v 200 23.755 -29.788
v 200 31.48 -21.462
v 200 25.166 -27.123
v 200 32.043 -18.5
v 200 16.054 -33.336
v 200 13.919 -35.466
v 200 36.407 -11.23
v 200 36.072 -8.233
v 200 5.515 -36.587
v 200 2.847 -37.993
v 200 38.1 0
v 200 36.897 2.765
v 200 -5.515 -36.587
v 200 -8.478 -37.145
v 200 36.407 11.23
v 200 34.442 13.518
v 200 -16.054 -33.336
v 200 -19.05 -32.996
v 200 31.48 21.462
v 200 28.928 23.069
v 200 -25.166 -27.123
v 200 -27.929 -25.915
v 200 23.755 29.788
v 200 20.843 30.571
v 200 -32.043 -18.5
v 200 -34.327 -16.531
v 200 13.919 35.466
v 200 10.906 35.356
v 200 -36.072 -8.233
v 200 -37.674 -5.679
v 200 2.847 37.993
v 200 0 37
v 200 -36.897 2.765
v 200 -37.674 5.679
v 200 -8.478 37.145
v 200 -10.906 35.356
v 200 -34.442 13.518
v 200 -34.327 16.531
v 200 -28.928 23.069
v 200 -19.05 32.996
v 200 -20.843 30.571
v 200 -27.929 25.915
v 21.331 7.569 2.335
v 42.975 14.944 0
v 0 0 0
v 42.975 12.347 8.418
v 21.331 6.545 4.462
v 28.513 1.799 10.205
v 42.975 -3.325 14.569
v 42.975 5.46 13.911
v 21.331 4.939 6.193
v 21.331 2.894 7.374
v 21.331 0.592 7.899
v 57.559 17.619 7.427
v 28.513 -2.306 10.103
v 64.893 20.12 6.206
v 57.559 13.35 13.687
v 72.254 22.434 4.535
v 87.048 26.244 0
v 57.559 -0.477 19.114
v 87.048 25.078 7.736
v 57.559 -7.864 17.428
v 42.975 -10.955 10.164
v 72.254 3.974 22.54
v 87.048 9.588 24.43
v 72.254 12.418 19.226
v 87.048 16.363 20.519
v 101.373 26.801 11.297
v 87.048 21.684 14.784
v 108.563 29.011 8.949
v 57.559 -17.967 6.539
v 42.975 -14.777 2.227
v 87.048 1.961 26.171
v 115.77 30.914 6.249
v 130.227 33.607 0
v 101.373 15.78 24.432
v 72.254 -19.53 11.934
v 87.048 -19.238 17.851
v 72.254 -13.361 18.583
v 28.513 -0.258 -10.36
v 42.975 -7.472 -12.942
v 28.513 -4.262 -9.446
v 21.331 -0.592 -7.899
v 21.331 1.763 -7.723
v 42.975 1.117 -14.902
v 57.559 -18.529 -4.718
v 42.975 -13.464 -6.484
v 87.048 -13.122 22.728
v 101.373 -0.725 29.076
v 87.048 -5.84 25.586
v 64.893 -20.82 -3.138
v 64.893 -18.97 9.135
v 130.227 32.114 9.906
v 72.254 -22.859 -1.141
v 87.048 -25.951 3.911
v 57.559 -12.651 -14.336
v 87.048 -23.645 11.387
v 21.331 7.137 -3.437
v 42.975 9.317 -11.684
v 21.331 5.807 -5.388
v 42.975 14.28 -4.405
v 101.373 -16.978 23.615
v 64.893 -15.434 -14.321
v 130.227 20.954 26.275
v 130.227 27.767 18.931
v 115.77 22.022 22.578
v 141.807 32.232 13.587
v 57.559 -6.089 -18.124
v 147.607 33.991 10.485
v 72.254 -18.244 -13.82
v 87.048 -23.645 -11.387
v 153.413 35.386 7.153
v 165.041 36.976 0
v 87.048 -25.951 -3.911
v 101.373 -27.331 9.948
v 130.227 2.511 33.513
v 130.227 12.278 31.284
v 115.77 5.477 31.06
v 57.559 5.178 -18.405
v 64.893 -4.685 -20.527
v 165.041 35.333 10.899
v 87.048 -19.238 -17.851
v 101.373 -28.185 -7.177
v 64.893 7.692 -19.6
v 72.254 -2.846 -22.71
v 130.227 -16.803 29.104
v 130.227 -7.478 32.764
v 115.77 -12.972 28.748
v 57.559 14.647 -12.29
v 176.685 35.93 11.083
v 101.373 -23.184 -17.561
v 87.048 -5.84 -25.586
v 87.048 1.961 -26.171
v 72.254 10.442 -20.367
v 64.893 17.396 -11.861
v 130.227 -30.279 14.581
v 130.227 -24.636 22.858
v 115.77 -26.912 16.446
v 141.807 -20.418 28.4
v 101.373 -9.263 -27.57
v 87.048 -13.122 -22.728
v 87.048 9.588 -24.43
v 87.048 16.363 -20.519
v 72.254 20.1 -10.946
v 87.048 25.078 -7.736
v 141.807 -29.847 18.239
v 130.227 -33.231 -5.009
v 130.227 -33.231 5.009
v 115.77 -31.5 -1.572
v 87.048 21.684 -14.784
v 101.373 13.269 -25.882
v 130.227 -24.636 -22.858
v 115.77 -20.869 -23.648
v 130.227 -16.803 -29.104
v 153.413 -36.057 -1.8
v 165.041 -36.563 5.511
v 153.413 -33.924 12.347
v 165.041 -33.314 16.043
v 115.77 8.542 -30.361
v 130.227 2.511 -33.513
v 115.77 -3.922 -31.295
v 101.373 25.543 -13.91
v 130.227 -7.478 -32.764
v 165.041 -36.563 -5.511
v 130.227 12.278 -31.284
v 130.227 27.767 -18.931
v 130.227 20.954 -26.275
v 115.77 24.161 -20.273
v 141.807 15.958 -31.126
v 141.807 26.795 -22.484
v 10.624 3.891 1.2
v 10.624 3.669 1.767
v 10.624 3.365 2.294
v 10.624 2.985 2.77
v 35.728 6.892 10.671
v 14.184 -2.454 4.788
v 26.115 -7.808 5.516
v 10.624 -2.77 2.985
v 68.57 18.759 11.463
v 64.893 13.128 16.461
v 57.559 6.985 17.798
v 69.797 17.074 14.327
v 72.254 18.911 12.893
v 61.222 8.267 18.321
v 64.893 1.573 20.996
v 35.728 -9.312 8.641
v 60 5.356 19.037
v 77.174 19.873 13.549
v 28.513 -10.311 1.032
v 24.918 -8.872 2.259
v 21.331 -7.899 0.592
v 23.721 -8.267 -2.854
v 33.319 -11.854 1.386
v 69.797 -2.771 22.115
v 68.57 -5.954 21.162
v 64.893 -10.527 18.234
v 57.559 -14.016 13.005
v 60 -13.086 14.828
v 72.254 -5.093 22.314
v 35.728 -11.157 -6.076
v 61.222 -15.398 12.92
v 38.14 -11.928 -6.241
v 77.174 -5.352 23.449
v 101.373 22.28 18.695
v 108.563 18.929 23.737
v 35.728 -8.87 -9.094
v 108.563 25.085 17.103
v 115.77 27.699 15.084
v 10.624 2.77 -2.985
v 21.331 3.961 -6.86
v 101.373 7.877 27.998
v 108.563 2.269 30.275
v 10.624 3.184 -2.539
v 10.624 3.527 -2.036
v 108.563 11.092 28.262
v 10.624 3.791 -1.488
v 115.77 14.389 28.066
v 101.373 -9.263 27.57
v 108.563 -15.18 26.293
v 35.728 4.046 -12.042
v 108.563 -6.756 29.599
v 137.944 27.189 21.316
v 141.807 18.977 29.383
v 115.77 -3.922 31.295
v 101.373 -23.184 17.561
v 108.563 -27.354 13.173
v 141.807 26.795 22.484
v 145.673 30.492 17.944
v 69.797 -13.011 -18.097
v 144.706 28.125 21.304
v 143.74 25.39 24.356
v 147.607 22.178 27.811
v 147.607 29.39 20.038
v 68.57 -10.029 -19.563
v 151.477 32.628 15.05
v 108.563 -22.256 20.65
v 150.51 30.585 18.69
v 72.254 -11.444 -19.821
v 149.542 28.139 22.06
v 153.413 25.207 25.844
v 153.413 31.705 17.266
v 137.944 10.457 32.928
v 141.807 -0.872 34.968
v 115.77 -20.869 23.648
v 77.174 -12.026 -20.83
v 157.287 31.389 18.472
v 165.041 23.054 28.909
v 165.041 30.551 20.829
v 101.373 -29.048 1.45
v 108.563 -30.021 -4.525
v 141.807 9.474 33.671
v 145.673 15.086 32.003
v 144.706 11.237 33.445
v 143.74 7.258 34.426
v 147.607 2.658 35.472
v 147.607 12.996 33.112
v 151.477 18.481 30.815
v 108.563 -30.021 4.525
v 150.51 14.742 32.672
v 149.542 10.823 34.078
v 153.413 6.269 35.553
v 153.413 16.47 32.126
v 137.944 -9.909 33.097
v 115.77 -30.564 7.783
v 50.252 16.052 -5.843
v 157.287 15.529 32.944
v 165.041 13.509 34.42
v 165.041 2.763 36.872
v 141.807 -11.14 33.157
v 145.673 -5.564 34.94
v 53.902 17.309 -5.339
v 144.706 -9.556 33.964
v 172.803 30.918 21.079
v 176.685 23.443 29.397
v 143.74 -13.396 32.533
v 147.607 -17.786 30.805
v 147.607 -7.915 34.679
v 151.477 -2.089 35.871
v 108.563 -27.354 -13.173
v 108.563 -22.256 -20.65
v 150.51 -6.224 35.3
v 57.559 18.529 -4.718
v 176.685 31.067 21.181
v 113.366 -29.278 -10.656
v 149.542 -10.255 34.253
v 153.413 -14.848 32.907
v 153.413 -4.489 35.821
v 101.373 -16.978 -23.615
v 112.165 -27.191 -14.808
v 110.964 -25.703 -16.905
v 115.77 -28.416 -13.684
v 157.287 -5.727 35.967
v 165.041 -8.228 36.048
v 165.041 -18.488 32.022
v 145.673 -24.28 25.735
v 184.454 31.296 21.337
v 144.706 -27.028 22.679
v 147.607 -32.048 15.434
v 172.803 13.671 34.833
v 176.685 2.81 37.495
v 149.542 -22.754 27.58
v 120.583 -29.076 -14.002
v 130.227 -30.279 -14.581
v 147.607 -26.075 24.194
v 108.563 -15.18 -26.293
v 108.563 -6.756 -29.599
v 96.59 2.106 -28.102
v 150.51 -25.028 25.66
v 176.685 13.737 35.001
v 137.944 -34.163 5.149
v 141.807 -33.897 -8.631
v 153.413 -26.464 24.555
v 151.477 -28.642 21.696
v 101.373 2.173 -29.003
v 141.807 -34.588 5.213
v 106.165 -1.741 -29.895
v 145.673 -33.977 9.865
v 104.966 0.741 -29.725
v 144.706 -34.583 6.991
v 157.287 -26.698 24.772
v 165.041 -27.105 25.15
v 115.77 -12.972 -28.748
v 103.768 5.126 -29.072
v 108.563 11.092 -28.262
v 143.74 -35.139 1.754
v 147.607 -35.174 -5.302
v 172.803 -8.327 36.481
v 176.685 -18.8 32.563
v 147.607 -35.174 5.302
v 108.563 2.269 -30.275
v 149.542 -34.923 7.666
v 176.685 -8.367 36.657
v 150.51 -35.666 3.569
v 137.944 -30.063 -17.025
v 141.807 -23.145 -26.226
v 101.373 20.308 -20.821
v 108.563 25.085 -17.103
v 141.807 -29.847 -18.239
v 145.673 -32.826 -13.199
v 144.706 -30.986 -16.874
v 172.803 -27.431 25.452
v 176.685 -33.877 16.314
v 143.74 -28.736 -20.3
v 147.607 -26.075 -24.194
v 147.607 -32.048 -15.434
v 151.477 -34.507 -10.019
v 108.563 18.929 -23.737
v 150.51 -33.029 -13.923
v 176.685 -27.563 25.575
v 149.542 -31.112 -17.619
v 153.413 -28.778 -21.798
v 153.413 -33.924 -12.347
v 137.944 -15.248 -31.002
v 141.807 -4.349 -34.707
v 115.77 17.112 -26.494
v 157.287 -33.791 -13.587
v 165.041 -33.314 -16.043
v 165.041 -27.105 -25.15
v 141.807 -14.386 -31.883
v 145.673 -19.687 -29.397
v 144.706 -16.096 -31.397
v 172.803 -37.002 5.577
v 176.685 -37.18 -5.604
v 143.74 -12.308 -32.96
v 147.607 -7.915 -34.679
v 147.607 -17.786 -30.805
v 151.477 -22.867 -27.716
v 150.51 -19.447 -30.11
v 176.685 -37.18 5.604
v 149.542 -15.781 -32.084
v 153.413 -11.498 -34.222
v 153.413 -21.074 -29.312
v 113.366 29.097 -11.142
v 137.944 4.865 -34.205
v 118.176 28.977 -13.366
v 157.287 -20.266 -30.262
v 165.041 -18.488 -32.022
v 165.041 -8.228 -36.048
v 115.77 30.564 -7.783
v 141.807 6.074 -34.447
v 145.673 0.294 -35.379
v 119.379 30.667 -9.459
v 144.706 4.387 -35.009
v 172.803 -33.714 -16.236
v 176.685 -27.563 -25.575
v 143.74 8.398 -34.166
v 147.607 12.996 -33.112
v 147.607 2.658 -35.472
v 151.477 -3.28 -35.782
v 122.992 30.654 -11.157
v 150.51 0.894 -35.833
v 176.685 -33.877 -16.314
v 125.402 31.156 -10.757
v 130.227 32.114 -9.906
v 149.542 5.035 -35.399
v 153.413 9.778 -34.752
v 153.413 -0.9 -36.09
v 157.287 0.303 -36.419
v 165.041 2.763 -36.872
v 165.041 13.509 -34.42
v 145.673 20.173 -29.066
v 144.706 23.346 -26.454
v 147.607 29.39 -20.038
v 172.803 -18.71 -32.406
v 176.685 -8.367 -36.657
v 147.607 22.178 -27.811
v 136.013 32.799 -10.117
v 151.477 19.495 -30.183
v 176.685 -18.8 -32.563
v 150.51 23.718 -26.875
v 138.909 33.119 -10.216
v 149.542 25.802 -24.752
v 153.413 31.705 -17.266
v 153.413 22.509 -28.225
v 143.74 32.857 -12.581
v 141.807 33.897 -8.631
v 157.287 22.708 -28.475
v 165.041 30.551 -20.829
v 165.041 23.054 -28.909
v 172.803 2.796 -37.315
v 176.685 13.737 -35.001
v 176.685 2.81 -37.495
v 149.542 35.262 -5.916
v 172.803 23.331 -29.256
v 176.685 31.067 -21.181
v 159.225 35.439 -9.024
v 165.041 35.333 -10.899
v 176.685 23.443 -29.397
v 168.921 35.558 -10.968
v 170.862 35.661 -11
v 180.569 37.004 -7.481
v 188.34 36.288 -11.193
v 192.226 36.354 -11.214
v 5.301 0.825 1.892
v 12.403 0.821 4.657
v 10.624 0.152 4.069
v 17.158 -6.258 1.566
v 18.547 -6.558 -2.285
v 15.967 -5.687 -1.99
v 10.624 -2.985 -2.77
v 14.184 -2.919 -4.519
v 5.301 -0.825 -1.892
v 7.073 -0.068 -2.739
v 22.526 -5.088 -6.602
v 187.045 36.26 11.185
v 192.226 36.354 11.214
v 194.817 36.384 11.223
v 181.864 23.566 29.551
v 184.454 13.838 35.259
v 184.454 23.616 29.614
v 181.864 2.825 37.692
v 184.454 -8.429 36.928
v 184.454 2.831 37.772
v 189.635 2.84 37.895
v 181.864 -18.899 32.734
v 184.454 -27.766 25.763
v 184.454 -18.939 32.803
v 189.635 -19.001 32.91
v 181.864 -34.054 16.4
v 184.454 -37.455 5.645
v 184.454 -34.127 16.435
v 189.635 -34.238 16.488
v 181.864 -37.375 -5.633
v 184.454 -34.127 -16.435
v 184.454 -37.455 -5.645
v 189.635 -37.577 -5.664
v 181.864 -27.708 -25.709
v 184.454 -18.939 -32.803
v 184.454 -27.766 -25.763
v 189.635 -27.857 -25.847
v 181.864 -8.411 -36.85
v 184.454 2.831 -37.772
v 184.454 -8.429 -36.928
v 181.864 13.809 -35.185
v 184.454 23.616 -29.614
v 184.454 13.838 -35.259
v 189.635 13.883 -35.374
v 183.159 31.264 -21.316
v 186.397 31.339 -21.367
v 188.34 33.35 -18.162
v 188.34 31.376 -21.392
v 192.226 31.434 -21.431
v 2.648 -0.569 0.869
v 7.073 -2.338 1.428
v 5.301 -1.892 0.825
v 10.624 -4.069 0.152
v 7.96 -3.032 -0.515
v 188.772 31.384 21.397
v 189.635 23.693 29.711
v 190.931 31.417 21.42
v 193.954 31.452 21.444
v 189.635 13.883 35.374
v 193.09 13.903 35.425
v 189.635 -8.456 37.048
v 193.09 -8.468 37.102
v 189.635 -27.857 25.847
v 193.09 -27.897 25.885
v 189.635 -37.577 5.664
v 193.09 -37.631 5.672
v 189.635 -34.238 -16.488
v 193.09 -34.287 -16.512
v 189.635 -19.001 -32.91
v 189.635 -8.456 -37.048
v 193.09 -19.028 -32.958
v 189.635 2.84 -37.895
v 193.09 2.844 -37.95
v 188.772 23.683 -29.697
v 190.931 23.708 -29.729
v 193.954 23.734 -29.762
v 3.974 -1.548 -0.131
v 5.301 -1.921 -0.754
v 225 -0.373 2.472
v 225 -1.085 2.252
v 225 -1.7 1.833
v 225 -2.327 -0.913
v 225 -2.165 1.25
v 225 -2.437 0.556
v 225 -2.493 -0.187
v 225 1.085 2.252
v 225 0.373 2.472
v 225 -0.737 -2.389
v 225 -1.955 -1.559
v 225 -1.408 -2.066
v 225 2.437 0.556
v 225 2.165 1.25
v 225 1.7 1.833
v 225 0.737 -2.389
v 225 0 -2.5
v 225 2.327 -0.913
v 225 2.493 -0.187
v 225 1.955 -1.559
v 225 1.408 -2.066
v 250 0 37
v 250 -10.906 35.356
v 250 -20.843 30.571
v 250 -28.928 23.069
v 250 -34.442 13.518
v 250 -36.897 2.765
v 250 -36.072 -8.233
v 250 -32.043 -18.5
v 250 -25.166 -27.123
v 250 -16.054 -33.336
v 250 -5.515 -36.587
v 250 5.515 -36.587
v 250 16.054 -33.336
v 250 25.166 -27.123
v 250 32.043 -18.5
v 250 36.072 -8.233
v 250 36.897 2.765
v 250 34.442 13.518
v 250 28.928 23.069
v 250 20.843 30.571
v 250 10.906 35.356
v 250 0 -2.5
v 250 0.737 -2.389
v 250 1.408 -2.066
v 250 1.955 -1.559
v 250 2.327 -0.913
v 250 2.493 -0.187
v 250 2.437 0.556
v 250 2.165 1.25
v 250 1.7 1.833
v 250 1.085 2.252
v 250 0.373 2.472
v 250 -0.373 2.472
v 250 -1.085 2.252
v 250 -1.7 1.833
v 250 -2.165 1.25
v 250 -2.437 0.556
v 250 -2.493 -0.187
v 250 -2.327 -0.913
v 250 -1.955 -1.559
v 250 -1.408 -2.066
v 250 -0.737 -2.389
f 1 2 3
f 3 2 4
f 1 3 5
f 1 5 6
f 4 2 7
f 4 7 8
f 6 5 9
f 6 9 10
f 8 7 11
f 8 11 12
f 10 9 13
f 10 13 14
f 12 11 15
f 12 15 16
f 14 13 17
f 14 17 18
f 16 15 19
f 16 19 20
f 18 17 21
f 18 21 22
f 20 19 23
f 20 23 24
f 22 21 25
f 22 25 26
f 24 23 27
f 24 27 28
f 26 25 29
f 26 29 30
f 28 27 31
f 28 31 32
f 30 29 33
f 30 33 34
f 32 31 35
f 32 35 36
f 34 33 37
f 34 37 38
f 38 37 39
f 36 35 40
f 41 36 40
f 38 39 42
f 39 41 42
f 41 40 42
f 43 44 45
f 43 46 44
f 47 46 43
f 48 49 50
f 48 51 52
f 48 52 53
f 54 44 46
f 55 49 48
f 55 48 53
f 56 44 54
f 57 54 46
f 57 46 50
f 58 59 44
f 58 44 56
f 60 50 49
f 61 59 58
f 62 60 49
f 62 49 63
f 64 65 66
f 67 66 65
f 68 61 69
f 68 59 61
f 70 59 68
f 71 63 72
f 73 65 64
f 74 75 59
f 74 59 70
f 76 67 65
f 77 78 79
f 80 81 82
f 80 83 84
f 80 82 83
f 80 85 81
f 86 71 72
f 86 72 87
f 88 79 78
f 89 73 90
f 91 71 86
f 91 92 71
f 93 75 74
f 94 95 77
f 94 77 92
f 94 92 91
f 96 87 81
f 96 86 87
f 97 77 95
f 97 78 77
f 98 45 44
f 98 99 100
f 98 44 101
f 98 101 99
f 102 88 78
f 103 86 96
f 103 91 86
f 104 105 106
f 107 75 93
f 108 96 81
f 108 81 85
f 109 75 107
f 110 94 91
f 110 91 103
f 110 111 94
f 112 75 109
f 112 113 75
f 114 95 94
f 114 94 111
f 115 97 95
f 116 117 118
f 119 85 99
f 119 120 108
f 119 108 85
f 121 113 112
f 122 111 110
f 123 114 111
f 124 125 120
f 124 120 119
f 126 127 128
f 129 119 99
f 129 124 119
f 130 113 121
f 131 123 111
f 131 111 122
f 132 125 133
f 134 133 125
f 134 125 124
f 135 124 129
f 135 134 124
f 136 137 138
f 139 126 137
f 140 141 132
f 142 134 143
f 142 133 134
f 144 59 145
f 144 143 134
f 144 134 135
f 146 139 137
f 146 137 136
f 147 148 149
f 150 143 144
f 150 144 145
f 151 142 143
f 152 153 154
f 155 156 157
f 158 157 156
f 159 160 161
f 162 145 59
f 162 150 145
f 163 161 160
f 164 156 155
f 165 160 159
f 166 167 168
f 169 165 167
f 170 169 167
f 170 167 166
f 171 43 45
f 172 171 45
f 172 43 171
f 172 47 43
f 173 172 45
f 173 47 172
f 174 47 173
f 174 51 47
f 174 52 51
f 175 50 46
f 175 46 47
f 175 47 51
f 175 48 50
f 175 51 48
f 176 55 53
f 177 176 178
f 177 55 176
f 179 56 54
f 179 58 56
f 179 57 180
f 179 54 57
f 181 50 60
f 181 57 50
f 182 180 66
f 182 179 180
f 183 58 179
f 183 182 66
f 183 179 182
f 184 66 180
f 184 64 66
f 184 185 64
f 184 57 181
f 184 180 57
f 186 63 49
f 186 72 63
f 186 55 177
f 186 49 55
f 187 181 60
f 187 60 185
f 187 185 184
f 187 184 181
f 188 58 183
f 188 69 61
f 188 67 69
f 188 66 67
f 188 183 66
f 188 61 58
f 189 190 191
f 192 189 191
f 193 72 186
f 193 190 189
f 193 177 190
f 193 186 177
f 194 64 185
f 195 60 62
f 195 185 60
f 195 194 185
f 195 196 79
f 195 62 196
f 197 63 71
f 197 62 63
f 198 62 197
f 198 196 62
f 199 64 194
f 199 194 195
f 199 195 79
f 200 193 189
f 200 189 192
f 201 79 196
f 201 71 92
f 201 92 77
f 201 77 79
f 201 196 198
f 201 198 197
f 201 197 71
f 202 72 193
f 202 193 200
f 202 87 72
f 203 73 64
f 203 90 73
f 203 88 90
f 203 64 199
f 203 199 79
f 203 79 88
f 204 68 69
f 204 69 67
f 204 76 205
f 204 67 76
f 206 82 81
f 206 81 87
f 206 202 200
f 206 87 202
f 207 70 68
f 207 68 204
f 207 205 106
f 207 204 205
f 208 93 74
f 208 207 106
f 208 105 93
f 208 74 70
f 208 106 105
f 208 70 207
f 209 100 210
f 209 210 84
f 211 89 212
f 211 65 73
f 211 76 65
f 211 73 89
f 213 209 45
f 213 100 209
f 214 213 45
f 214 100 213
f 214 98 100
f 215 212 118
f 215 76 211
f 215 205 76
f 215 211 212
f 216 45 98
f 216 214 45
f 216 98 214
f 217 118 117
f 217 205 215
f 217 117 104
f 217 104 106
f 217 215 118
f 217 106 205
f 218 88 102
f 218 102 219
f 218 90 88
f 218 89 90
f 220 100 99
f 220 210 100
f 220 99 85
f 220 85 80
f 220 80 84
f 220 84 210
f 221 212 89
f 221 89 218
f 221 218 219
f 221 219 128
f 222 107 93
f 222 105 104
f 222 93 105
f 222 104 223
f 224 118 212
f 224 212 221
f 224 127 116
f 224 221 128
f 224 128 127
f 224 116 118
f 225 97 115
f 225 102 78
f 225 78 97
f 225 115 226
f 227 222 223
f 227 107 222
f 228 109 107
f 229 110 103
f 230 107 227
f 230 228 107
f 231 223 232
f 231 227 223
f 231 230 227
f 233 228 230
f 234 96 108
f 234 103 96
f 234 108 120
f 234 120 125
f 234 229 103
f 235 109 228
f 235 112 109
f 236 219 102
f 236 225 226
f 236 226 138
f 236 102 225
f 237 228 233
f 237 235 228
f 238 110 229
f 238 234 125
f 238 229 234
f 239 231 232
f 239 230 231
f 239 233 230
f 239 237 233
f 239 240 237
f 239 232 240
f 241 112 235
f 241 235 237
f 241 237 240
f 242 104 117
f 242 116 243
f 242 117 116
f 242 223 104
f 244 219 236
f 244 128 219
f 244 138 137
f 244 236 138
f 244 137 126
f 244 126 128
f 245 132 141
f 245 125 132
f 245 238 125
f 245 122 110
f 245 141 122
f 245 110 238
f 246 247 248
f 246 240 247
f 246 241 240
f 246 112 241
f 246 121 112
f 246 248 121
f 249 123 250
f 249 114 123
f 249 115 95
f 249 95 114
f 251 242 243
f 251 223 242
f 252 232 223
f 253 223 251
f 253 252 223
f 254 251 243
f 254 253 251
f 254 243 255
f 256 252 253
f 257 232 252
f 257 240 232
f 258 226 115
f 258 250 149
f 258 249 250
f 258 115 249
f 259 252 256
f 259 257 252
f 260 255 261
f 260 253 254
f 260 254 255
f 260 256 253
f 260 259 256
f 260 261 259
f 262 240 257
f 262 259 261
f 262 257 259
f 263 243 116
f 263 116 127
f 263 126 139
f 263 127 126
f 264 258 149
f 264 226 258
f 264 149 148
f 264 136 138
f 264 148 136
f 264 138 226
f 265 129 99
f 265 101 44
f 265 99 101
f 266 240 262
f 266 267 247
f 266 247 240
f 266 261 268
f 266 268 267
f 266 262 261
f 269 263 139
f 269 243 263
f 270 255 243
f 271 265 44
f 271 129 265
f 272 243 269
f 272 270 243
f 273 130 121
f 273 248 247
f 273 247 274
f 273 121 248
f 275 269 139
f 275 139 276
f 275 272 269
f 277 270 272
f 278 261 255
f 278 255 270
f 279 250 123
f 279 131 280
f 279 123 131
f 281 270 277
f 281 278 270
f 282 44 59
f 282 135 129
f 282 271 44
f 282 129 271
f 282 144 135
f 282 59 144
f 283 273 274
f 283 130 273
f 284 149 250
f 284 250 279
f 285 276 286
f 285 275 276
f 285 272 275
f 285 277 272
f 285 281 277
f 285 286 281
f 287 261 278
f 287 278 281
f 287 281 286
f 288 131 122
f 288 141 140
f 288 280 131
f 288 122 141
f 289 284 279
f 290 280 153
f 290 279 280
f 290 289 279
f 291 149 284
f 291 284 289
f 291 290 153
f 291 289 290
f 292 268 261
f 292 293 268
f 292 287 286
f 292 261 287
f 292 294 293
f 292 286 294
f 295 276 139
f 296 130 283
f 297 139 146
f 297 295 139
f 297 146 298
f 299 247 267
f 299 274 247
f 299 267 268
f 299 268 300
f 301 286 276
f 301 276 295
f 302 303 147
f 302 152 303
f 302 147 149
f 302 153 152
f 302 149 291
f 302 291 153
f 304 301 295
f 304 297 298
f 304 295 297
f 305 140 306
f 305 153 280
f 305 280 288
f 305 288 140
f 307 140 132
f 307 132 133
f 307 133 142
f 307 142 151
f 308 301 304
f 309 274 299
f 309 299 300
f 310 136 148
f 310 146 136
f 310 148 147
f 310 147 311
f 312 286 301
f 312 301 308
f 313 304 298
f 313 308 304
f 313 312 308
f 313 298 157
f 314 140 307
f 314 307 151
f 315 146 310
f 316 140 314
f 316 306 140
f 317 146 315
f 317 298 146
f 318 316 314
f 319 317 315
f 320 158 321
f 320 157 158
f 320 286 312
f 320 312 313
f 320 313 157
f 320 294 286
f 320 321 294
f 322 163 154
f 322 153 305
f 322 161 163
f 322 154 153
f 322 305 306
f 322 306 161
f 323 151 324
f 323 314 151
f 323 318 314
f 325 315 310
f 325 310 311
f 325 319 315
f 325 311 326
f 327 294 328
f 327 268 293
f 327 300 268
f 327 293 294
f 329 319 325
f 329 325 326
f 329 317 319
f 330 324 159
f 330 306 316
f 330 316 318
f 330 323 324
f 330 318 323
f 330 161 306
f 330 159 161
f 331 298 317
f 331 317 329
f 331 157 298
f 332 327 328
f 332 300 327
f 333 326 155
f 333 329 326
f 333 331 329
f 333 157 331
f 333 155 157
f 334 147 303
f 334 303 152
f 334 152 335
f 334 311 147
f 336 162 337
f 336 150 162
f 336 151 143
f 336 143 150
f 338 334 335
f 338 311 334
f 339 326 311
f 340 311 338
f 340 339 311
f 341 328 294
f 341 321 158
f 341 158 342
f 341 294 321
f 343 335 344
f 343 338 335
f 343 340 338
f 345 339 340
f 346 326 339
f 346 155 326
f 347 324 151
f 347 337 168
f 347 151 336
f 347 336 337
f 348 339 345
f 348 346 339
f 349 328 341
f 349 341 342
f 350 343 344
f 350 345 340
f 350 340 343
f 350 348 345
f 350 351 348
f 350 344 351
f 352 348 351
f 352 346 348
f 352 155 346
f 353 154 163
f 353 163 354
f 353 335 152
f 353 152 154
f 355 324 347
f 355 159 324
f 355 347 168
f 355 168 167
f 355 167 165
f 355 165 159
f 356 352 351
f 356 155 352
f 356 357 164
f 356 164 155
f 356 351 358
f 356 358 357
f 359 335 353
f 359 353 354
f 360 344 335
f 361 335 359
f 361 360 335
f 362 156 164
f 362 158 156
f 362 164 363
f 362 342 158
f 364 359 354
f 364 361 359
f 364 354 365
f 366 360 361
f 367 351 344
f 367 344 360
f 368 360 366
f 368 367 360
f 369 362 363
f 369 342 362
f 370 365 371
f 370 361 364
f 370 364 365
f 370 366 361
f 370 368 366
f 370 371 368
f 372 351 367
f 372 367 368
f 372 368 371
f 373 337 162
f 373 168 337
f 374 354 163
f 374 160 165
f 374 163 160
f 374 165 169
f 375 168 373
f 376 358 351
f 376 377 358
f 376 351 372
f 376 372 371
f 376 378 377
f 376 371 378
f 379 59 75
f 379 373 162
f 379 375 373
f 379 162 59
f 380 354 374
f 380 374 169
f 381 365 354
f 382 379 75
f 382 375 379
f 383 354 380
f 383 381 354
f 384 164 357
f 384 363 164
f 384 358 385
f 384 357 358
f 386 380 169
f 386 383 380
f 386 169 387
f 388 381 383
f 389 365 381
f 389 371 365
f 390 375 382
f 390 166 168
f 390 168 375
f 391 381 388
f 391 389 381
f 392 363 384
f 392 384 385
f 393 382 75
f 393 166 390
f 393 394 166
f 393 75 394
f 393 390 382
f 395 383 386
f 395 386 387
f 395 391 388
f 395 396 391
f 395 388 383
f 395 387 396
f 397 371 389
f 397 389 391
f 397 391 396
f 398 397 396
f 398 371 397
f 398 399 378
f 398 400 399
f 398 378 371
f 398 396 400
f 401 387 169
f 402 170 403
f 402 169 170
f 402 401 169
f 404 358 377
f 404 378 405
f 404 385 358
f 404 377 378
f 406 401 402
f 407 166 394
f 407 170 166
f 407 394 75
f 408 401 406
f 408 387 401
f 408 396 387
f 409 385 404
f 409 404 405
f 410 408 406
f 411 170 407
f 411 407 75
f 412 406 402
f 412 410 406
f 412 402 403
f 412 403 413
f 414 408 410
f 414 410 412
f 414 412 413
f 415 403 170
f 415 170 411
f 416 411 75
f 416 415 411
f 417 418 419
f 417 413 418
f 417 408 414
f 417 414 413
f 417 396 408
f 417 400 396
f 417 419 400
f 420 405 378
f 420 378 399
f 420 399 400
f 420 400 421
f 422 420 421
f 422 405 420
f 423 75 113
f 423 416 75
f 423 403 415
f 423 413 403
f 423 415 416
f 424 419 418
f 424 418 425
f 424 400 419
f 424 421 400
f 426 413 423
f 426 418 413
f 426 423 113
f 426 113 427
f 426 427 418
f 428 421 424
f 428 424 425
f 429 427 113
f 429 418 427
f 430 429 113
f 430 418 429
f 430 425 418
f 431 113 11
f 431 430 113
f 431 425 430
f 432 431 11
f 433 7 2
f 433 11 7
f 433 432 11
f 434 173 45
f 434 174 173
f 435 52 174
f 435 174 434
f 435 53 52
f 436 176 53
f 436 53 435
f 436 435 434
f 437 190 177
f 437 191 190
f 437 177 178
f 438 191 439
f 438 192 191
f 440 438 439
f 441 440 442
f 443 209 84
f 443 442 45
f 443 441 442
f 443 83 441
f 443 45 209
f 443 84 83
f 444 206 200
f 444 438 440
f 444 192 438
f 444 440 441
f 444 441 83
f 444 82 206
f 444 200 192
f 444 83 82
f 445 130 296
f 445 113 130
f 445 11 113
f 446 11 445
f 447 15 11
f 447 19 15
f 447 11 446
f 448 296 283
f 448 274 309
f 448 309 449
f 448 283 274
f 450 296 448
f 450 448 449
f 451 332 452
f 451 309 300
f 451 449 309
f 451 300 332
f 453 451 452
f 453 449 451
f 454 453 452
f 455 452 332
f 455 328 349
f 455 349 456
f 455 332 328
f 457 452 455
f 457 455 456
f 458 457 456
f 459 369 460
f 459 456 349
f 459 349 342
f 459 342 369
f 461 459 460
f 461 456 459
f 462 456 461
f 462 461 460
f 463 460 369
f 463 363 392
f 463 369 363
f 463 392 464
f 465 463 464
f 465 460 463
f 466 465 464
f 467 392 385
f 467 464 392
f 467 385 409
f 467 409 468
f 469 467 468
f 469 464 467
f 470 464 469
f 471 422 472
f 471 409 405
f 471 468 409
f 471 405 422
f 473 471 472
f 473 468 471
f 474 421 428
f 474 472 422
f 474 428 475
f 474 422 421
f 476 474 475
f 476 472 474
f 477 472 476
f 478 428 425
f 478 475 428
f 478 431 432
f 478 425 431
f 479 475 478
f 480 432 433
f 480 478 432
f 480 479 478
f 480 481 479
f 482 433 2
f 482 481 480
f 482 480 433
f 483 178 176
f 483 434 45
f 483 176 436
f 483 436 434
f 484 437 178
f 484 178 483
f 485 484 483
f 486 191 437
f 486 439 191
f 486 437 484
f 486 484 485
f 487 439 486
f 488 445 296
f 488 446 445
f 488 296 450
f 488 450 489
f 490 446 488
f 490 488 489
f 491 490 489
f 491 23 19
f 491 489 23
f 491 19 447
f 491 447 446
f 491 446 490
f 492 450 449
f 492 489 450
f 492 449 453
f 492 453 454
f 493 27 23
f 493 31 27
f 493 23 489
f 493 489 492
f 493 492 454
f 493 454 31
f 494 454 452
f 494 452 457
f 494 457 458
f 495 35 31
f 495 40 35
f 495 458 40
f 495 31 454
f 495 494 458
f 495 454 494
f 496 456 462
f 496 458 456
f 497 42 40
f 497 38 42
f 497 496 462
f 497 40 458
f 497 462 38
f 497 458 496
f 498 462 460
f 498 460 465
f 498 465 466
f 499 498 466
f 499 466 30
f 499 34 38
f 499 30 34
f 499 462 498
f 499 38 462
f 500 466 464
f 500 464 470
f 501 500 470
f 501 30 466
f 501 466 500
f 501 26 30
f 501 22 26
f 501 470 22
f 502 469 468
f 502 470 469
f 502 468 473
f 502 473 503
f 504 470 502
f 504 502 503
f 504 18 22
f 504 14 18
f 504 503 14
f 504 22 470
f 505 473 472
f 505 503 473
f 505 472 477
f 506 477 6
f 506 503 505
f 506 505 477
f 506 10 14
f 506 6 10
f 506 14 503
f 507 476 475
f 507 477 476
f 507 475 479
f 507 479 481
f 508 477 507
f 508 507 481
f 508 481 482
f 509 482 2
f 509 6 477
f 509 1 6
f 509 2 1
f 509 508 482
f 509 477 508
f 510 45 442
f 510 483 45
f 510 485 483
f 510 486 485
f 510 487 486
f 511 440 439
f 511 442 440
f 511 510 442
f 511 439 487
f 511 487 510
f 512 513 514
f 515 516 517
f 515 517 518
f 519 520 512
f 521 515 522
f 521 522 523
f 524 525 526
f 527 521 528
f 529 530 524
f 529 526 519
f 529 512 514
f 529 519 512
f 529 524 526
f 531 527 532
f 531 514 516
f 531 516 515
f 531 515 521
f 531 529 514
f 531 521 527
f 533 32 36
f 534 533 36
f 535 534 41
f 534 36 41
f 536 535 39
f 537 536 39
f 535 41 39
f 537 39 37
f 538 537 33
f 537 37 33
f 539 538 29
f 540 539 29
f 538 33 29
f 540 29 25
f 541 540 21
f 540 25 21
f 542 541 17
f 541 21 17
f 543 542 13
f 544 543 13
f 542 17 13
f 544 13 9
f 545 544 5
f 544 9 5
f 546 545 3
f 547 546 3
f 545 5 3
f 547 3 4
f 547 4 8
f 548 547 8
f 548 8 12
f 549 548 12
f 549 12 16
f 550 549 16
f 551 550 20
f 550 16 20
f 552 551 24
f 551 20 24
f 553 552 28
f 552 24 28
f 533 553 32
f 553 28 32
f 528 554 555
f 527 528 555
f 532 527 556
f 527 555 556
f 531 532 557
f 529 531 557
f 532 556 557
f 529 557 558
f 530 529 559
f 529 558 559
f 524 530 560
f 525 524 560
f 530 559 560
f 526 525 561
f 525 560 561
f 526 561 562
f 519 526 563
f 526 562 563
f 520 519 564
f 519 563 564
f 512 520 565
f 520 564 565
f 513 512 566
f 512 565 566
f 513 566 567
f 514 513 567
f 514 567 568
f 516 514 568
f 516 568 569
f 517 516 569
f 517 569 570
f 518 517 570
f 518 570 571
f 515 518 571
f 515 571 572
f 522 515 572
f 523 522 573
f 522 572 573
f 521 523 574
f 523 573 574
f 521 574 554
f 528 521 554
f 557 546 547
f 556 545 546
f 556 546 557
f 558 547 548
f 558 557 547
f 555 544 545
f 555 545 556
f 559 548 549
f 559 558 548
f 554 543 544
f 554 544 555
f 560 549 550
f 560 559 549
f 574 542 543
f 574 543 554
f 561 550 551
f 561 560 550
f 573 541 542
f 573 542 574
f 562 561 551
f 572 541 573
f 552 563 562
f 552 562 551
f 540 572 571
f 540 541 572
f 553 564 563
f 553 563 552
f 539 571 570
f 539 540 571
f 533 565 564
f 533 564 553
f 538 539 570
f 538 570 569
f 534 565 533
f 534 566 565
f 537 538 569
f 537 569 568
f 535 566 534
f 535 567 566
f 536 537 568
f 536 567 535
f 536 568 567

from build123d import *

# Parameters (mm, degrees)
SKETCH10_R          = 37
BOSS_EXTRUDE1_DEPTH = 50
SKETCH11_R          = 2.5
CUT_EXTRUDE1_DEPTH  = 25


with BuildPart() as part:
    # Sketch3 → Revolve1 (revolve)
    with BuildSketch(Plane.XY):
        with BuildLine():
            Line((0, 0), (200, 0))
            Line((200, 0), (200, 38.1))
            add(Edge.make_bspline(
                [(0, 0), (0.333278549, 0.131540873), (0.999577039, 0.394520549), (1.999623692, 0.786334891), (2.999614377, 1.17601578), (4.66502861, 1.821148753), (7.328741847, 2.840985756), (11.325969227, 4.339896645), (15.327567951, 5.800346847), (21.648365914, 8.05135545), (32.594864134, 11.782666432), (44.617809557, 15.495925888), (54.658642309, 18.334838057), (59.993667814, 19.782959156), (64.329338058, 20.915666696), (68.662820277, 22.01269926), (73.990330688, 23.318521745), (78.993971117, 24.479998264), (83.997331558, 25.591796678), (87.330083915, 26.309365893), (93.324657038, 27.552988579), (99.987226118, 28.850738677), (109.652181507, 30.574297106), (118.320286798, 31.962202042), (124.997544263, 32.910660178), (132.98954992, 33.985397902), (141.318339795, 34.97224064), (150.663527404, 35.869691178), (156.997734153, 36.407242182), (166.989872456, 37.153259543), (176.661040051, 37.642869627), (186.332724985, 37.936353666), (190.666251166, 38.027993755), (194.333291829, 38.071814955), (195.999993248, 38.085597183), (196.999994924, 38.092040964), (197.999996625, 38.09660679), (198.999998309, 38.099469797), (199.666666479, 38.099823266), (200, 38.1)],
                knots=[0, 0, 0, 0, 0.005248402, 0.010492732, 0.015733018, 0.020969291, 0.036654322, 0.057513275, 0.083502072, 0.099051411, 0.155796901, 0.252897726, 0.283342643, 0.308639705, 0.333872761, 0.348983013, 0.37411934, 0.414220017, 0.424223641, 0.44919678, 0.464156839, 0.513902353, 0.54862082, 0.607960951, 0.642483277, 0.647409944, 0.726082727, 0.765324507, 0.784925615, 0.819199979, 0.912095095, 0.926749999, 0.960936877, 0.975586084, 0.980468966, 0.985351783, 0.990234549, 0.995117283, 1, 1, 1, 1], degree=3))
        make_face()
    revolve(axis=Axis((0, 0, 0), (1, 0, 0)))

    # Sketch10 → Boss-Extrude1 (add)
    with BuildSketch(Plane(origin=(200, 0, 0), x_dir=(0, 0, -1), z_dir=(1, 0, 0))):
        with Locations(Location((0, 0, 0), (0, 0, 180))):
            Circle(SKETCH10_R)
    extrude(amount=BOSS_EXTRUDE1_DEPTH)

    # Sketch11 → Cut-Extrude1 (cut)
    with BuildSketch(Plane(origin=(250, 0, 0), x_dir=(0, 0, -1), z_dir=(1, 0, 0))):
        Circle(SKETCH11_R)
    extrude(amount=-CUT_EXTRUDE1_DEPTH, mode=Mode.SUBTRACT)


solid = part.part
